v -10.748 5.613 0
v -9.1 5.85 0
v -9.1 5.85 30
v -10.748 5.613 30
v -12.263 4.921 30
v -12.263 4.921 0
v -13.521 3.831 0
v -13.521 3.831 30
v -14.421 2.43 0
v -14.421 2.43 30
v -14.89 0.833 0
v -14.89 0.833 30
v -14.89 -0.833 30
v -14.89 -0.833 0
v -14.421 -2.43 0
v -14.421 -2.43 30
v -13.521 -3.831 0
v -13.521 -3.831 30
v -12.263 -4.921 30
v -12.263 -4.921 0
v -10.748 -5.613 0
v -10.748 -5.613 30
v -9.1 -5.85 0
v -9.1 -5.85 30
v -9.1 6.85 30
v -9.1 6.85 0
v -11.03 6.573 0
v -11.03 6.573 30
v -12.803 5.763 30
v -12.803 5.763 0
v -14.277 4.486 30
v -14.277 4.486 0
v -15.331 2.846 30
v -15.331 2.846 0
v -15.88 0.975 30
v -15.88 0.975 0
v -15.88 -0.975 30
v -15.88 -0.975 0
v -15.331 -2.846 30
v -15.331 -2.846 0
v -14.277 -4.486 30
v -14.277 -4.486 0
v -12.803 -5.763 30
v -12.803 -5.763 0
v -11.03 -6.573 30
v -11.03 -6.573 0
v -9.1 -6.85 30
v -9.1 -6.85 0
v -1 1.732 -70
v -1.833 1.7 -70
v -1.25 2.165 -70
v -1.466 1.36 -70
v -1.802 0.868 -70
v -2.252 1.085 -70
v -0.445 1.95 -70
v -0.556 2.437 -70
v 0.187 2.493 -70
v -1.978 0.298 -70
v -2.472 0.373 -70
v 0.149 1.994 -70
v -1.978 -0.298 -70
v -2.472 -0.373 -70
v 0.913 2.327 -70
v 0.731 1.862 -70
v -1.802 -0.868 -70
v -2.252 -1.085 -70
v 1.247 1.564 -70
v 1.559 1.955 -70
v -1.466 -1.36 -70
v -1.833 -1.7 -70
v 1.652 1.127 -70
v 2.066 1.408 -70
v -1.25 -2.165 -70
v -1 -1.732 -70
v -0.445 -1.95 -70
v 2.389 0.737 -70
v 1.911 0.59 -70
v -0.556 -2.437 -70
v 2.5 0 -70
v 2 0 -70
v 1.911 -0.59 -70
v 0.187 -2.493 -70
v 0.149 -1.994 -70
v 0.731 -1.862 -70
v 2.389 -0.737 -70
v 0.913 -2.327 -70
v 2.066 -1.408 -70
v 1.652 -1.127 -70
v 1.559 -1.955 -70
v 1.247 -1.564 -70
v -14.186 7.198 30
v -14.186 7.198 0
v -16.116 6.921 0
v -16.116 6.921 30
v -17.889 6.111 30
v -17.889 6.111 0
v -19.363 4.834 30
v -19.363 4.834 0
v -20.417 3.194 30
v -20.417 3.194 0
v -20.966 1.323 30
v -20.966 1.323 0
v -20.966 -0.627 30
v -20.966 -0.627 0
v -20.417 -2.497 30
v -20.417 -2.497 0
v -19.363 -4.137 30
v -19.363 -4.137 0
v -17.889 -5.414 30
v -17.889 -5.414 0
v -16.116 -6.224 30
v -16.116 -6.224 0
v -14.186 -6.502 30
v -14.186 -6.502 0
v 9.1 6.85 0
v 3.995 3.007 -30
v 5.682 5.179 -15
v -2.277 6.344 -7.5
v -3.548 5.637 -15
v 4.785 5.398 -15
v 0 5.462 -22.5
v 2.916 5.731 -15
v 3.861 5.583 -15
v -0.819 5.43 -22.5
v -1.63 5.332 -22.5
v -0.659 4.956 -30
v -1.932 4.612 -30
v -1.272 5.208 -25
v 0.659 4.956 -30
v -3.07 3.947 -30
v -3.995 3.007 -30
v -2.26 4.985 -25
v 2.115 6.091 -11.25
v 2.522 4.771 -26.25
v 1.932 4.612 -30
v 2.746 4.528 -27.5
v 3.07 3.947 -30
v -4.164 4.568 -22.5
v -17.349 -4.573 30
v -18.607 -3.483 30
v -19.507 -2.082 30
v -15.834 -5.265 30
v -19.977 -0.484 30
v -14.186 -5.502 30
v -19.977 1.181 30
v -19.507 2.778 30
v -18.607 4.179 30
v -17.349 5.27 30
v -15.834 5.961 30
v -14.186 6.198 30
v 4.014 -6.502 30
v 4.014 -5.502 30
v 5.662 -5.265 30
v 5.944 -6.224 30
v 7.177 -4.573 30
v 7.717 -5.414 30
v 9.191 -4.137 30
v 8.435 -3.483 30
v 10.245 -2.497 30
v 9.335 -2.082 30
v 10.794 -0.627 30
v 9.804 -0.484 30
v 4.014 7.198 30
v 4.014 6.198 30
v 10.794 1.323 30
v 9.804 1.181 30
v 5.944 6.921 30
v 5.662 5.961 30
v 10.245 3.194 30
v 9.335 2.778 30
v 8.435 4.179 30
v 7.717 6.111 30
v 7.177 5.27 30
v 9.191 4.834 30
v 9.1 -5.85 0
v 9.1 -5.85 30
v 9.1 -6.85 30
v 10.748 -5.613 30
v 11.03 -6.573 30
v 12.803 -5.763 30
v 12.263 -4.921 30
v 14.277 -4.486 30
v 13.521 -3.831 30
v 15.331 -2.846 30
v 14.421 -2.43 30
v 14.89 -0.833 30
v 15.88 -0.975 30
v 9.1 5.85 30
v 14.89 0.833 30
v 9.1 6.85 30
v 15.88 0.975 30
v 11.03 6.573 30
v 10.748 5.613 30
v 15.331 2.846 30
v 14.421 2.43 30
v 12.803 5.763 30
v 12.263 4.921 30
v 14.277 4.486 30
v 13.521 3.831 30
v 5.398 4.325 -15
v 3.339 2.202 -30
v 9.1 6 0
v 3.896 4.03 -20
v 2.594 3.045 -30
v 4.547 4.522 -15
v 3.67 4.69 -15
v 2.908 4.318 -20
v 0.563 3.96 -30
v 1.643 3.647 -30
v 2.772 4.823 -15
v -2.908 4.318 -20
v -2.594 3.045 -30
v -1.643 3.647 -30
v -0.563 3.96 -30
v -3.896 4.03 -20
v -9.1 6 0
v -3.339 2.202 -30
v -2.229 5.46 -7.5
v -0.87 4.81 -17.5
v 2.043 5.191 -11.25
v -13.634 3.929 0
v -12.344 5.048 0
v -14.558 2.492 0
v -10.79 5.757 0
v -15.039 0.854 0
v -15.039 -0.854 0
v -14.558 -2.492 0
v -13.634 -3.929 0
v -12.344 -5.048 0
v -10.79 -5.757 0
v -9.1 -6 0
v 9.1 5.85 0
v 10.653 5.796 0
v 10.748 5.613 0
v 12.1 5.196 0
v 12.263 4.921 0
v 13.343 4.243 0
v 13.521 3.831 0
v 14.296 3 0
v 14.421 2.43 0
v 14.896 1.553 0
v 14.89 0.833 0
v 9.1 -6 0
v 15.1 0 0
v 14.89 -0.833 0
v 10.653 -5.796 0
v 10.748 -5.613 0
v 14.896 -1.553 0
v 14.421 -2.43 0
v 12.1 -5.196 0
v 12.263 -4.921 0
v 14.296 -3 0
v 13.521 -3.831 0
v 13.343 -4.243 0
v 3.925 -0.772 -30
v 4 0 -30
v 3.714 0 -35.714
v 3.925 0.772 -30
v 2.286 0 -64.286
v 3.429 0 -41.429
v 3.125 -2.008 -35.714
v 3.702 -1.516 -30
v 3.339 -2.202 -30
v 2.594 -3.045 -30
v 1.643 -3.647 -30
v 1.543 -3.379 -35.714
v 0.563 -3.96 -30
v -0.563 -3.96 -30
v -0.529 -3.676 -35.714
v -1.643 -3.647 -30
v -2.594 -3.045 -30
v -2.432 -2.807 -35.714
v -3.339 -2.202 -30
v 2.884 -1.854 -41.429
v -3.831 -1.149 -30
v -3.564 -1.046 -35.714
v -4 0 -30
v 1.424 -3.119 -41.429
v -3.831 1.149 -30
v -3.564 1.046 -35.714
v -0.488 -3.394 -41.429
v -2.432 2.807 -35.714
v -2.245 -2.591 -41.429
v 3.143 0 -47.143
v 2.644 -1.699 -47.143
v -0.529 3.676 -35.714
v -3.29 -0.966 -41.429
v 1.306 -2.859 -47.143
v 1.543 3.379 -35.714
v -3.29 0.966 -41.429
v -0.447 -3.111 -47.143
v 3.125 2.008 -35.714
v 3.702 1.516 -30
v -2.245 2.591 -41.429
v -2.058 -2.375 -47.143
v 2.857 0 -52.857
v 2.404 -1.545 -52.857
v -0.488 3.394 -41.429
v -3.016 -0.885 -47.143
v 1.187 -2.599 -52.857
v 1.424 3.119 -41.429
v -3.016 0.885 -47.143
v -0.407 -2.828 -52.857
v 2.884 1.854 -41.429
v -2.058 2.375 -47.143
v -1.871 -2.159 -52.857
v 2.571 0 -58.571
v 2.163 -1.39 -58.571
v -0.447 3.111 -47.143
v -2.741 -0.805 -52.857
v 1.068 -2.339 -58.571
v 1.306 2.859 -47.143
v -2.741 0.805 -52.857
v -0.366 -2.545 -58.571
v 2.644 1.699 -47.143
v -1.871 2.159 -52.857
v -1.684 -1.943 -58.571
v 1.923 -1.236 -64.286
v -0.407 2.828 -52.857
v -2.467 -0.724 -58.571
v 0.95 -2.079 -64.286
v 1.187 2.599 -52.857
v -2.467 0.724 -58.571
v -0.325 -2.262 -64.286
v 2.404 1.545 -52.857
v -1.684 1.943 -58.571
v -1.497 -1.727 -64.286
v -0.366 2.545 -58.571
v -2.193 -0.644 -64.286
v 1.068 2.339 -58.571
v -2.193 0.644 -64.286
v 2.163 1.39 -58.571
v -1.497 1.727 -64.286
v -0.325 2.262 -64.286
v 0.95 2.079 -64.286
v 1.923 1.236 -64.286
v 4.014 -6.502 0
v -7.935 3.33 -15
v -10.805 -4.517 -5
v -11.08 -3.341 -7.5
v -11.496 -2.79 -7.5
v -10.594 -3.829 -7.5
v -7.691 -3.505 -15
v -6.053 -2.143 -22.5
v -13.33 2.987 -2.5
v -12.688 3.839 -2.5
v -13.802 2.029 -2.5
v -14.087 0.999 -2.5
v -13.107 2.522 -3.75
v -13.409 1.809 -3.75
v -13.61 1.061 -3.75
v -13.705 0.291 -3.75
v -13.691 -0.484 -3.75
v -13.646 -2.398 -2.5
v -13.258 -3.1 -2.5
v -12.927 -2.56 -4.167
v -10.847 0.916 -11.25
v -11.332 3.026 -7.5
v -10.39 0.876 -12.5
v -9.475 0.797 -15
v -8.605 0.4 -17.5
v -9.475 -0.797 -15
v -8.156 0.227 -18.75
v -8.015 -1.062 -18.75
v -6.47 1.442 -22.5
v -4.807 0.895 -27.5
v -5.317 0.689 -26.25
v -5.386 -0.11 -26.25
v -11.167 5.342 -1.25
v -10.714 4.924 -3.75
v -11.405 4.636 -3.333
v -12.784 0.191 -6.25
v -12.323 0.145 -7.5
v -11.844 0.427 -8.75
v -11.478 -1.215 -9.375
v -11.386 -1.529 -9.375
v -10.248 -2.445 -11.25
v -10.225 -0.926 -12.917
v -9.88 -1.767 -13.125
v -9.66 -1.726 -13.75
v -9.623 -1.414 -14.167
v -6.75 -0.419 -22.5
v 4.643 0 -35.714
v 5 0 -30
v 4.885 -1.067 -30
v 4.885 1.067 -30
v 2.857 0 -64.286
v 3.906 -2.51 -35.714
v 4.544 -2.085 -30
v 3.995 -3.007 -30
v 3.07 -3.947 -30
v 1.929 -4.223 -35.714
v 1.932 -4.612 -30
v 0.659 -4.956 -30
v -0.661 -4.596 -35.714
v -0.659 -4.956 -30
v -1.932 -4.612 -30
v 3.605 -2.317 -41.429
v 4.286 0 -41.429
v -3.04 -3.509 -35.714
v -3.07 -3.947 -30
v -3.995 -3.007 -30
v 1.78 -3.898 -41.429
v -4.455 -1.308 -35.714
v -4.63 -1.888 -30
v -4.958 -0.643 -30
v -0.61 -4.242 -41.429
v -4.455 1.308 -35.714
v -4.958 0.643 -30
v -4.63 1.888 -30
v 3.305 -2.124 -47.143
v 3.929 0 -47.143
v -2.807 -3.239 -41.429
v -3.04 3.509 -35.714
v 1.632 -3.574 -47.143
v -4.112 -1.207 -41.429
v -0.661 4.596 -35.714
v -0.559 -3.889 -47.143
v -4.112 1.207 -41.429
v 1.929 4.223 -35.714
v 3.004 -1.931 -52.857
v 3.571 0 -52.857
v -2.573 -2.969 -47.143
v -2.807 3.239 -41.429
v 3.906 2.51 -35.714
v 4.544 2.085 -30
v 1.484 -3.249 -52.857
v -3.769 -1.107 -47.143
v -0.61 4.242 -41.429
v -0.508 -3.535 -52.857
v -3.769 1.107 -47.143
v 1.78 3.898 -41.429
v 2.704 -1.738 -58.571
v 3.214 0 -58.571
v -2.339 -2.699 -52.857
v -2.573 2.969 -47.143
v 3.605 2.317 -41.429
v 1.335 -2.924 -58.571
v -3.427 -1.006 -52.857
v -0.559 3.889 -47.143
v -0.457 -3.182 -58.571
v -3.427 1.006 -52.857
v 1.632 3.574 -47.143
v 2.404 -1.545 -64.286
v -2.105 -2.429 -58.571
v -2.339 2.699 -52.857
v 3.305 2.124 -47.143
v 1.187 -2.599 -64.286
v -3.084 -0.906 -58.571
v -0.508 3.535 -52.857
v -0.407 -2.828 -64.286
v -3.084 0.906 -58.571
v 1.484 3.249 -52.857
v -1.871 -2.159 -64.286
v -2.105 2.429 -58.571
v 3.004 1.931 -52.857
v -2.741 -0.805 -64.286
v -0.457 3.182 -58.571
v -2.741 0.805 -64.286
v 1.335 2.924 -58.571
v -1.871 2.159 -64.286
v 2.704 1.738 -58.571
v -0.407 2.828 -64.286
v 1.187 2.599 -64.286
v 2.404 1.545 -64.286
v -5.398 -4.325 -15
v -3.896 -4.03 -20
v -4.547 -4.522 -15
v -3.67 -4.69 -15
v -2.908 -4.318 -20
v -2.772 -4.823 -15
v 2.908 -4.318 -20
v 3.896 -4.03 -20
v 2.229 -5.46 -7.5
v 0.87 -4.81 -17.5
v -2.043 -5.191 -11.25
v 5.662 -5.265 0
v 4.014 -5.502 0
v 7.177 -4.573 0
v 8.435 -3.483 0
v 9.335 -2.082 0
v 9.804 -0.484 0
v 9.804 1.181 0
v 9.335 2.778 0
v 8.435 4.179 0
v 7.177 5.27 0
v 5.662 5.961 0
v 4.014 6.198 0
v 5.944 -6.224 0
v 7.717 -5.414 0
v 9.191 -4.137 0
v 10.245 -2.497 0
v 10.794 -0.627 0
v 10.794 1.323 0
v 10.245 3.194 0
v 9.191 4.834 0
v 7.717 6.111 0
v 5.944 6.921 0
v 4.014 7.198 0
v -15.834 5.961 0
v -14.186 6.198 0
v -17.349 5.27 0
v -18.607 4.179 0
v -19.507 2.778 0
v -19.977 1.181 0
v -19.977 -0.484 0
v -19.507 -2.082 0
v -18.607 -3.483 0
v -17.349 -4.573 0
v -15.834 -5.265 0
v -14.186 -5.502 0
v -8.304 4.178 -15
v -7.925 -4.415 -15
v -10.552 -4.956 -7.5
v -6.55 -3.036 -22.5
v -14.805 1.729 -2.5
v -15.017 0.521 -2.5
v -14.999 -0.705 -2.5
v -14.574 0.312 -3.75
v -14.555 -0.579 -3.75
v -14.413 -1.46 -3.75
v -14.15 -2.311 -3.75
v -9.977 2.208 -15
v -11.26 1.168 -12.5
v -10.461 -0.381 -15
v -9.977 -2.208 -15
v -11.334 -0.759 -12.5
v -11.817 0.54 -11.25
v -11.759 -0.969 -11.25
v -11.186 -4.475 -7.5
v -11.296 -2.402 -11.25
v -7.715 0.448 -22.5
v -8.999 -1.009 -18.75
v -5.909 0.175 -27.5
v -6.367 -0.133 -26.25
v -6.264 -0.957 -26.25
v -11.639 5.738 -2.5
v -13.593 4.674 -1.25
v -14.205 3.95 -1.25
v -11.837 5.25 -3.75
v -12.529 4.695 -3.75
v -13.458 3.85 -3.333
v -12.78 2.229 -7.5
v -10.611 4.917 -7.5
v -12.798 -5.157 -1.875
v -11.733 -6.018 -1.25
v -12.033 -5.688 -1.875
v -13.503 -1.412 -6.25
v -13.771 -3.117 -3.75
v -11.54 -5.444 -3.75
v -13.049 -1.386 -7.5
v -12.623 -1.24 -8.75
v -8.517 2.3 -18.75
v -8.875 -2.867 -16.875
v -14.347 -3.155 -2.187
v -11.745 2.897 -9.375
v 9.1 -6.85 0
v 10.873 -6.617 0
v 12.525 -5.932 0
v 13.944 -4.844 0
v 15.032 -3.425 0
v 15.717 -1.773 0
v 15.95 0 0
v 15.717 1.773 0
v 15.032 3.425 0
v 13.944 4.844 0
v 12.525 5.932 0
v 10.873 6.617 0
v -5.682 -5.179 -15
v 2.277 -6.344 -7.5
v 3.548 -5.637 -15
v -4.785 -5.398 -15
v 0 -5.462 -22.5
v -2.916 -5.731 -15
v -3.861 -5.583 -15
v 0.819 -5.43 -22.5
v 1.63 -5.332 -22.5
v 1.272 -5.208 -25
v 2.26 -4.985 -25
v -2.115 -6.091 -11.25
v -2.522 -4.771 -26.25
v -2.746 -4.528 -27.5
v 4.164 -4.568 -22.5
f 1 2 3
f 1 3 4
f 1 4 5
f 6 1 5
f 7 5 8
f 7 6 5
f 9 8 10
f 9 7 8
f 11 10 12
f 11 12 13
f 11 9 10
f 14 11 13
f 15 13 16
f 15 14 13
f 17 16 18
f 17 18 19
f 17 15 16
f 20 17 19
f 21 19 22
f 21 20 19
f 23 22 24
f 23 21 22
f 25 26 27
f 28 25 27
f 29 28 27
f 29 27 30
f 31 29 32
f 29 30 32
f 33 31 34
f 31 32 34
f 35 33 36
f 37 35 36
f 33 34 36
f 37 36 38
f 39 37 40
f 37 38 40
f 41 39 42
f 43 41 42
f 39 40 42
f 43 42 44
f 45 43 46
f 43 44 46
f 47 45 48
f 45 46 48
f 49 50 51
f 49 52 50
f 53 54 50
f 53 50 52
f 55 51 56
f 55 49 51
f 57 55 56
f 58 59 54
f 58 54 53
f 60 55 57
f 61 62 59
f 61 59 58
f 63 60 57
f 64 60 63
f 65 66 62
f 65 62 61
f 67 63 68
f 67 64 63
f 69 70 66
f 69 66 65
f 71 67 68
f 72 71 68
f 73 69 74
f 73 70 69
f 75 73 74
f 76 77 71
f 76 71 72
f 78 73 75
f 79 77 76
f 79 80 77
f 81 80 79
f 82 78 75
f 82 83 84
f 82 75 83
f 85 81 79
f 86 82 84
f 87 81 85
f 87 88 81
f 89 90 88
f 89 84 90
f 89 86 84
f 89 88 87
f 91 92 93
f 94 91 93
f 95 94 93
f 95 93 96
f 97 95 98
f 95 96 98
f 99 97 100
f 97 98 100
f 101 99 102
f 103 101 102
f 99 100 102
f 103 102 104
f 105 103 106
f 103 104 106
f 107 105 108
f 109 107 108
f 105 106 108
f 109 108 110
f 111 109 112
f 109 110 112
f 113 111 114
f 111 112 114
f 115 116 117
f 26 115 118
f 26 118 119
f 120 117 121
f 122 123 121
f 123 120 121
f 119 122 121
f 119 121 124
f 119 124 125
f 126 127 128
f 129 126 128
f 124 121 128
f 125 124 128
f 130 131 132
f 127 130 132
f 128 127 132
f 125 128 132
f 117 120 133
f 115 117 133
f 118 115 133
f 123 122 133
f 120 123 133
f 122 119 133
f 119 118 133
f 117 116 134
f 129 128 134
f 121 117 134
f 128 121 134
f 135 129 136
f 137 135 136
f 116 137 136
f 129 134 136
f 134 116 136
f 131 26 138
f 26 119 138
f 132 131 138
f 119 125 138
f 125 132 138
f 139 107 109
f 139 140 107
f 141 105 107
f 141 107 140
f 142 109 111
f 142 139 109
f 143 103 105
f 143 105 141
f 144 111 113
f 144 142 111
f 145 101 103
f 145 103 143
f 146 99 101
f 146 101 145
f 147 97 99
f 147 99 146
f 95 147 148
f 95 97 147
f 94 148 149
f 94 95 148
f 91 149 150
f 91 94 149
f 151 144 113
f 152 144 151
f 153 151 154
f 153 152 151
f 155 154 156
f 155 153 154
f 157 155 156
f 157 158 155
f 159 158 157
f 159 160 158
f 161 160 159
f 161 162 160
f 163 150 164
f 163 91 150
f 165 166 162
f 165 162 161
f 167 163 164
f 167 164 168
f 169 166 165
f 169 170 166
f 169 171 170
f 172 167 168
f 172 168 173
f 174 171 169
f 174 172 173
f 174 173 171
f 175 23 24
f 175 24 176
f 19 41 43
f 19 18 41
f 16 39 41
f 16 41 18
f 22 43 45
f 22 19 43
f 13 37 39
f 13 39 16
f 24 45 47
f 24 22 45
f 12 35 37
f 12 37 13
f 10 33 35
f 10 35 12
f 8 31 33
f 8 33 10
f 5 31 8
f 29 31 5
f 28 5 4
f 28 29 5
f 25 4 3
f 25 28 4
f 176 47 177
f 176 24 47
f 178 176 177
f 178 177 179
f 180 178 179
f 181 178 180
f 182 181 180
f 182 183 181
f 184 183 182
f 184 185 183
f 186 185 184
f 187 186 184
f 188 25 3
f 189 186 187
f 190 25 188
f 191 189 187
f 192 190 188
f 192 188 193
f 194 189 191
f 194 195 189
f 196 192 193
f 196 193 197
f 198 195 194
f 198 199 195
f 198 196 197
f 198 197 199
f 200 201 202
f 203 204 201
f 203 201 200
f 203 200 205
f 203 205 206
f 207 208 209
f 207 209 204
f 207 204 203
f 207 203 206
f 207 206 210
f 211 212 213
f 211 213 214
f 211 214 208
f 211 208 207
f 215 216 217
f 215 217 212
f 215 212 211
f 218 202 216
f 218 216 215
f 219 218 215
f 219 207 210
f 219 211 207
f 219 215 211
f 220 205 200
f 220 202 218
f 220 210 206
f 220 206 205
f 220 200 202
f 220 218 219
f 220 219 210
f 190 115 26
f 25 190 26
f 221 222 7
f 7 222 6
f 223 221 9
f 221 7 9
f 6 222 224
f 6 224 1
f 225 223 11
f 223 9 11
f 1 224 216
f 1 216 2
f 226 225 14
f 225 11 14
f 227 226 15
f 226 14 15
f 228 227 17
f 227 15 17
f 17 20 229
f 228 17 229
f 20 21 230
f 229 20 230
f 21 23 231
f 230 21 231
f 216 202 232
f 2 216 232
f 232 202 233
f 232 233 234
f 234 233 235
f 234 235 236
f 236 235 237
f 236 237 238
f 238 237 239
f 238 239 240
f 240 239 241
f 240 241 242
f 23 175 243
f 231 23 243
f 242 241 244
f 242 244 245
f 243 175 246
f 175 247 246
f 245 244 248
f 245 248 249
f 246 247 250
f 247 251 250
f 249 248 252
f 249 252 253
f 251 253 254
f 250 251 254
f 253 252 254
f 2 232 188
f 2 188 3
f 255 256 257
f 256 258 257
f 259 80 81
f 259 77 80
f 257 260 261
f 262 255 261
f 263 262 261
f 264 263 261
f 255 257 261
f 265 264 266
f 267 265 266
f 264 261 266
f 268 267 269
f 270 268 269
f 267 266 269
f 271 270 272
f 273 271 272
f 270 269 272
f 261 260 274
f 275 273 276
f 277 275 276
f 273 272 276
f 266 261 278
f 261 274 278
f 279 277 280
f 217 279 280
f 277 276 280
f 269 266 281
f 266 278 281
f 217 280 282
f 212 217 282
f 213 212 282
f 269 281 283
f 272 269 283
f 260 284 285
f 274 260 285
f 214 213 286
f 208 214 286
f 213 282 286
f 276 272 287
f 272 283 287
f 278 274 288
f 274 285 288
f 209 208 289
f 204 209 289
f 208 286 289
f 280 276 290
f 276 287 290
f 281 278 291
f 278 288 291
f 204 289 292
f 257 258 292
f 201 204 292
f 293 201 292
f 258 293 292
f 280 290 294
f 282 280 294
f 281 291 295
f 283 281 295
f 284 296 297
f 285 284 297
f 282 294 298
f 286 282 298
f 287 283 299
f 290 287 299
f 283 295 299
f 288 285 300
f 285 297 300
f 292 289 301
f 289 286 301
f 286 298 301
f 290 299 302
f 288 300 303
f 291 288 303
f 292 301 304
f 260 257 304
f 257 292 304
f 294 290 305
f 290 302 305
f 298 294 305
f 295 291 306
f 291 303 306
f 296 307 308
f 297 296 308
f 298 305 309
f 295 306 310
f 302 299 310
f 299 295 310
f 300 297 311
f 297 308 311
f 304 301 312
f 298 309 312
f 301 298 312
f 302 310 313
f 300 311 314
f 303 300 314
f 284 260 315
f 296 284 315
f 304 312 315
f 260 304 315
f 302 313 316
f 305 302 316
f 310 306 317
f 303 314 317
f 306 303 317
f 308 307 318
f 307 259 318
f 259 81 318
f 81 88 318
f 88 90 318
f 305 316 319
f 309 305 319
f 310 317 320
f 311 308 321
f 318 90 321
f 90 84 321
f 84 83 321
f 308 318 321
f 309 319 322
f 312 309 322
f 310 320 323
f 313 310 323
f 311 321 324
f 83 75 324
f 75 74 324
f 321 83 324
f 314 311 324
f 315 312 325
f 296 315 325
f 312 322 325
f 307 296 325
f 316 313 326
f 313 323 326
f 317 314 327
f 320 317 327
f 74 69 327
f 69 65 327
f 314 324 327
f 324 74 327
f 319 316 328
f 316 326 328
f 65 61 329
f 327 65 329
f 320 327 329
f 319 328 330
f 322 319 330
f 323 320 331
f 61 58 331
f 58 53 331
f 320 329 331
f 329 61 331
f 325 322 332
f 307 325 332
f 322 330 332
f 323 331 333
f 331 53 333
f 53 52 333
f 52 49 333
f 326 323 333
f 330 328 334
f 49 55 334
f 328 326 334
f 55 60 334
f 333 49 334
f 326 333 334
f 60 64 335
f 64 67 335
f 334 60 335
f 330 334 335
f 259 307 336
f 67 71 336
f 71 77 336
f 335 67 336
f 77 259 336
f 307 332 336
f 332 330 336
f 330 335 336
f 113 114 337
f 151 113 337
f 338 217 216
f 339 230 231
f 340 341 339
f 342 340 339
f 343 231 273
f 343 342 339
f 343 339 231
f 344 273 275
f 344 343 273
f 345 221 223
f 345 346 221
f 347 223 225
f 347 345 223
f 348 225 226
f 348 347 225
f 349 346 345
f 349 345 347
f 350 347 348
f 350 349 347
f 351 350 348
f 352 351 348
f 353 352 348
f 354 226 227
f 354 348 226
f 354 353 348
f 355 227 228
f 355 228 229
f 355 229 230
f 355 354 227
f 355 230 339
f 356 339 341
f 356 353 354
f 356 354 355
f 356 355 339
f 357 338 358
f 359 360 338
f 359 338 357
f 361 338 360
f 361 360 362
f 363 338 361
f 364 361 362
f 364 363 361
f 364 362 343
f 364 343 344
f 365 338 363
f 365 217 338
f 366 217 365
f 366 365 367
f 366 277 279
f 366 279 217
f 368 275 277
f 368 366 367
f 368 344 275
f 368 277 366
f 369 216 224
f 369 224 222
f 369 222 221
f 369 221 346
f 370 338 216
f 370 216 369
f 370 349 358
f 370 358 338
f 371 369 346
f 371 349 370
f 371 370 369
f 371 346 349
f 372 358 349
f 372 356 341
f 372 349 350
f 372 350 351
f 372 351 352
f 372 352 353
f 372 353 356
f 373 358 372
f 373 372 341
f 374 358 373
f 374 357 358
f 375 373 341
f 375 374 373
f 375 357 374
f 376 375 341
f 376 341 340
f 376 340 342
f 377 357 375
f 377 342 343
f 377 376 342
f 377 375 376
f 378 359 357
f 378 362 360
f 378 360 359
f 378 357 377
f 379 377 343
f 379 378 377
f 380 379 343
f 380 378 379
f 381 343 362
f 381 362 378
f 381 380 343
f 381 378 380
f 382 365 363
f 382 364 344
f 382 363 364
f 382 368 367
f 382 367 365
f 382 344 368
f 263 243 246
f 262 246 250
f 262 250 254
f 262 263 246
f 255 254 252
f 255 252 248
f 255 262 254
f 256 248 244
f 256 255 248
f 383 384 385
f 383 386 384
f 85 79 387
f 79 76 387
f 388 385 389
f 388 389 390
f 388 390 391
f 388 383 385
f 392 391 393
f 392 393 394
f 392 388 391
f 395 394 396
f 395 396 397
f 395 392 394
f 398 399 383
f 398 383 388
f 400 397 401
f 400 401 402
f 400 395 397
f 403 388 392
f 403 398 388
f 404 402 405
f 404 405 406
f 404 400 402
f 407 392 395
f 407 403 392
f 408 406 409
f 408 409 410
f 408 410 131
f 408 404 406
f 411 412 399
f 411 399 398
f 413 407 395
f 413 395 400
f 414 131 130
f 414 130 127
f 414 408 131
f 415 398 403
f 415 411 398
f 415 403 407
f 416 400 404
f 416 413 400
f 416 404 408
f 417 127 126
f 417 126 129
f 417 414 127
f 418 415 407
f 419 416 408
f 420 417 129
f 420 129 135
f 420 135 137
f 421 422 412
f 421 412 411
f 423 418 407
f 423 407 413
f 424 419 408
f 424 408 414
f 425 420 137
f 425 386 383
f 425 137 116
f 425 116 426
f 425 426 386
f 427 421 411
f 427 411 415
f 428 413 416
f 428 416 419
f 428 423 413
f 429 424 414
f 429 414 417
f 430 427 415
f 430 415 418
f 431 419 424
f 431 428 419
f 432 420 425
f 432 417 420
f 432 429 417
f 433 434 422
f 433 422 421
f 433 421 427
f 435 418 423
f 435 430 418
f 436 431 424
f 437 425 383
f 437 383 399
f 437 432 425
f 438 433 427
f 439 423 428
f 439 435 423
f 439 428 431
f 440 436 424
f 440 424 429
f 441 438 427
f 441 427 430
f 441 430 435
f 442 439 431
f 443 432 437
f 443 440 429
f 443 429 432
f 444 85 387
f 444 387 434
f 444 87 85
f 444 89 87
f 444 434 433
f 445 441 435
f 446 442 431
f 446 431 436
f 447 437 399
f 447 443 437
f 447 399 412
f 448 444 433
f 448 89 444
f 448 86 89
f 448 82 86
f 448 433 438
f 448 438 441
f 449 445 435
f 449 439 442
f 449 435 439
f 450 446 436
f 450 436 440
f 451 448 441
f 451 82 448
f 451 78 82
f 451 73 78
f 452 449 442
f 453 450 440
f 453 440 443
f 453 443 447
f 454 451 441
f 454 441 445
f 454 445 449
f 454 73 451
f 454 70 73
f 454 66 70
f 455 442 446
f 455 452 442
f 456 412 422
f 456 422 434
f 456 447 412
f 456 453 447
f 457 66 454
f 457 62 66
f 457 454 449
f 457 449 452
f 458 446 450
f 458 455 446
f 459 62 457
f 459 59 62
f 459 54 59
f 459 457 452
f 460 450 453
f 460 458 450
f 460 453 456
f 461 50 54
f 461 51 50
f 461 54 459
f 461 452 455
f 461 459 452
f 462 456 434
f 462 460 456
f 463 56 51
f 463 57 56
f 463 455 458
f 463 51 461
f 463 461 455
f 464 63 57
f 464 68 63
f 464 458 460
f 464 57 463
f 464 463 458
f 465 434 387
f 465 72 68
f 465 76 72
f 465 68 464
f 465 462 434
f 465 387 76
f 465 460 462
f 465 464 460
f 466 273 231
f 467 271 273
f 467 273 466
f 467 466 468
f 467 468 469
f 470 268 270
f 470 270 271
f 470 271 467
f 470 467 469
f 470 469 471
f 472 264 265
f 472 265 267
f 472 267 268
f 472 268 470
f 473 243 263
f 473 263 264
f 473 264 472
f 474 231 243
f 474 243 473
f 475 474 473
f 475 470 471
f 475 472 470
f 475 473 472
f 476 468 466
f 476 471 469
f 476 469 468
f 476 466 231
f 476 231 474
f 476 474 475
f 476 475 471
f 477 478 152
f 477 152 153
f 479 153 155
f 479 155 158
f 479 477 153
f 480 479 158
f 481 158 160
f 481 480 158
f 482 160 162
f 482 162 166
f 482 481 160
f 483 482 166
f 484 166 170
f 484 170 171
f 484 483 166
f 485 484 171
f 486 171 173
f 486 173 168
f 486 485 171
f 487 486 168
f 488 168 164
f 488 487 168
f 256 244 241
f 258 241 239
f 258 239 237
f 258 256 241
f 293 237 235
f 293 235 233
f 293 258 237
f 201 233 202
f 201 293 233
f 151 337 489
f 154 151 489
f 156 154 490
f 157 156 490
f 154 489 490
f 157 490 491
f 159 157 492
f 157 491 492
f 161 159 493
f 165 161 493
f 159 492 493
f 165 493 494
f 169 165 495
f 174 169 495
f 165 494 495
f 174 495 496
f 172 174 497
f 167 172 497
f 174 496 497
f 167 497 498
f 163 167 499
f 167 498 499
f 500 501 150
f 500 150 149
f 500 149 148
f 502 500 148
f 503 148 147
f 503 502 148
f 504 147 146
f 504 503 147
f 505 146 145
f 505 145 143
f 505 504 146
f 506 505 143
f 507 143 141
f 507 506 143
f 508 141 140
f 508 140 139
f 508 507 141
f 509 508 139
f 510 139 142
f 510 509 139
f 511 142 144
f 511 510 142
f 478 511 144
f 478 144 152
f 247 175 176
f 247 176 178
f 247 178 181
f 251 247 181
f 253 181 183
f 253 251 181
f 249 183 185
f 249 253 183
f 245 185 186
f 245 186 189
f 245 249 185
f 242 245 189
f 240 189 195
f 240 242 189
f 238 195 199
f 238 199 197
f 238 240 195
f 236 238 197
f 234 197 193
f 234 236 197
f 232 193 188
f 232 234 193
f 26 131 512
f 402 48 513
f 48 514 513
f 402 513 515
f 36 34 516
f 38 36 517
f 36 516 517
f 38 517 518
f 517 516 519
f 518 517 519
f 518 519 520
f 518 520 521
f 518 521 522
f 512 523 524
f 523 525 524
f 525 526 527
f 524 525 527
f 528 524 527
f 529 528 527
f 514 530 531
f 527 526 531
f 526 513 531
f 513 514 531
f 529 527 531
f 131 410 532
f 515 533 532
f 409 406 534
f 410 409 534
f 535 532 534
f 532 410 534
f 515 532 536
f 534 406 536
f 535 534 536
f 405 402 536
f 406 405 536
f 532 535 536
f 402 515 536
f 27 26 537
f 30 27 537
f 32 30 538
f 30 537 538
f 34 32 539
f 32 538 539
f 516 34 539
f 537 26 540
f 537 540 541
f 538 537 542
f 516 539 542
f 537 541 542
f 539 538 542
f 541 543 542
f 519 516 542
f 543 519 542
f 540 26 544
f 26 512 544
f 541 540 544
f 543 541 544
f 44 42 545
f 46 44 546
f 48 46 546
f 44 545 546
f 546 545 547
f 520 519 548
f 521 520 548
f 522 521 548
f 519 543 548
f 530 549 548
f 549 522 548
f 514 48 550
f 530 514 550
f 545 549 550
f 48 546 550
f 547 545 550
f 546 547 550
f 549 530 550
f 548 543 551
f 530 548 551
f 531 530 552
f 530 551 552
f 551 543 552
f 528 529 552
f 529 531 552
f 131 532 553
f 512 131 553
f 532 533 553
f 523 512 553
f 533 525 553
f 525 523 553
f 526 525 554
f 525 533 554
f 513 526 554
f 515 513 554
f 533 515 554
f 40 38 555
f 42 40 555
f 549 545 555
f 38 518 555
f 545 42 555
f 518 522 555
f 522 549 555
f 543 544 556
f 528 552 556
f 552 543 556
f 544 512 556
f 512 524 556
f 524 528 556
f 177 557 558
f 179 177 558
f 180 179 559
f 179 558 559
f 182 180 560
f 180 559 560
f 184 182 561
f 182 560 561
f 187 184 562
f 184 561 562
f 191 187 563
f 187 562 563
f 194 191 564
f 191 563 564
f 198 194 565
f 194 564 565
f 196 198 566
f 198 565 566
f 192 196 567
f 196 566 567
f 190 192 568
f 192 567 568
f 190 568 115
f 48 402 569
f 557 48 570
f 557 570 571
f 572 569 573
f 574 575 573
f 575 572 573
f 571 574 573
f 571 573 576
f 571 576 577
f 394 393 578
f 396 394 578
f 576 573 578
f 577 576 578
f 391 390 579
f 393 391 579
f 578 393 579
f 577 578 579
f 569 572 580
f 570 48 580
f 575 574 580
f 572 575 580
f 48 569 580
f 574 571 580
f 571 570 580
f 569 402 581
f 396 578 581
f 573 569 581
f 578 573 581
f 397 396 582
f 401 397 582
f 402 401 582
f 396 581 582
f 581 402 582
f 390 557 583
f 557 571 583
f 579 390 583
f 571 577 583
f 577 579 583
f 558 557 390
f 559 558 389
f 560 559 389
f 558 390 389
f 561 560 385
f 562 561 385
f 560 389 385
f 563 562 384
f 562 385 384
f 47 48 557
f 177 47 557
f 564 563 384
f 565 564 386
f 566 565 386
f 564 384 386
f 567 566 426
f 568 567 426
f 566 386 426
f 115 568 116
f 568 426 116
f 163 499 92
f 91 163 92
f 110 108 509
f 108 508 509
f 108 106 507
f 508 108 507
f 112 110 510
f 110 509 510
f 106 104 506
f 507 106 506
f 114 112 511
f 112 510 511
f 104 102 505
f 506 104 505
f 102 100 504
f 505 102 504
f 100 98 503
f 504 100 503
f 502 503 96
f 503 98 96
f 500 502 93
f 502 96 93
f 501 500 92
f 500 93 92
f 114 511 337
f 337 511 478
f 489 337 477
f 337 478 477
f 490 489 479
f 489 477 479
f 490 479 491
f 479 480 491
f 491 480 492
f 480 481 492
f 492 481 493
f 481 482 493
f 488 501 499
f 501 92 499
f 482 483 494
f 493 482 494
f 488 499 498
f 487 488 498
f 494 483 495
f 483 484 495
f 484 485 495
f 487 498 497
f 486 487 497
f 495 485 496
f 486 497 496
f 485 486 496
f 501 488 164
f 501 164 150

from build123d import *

# Parameters (mm, degrees)
PAD_DEPTH      = 30
THICKNESS_T    = -1
PAD001_DEPTH   = 30
THICKNESS001_T = -1
SKETCH006_R    = 5
SKETCH007_R    = 4
SKETCH010_R    = 5
SKETCH008_R    = 2.5
SKETCH011_R    = 4
SKETCH009_R    = 2


with BuildPart() as body:
    # Sketch001 → Pad (new body)
    with BuildSketch(Plane.XY):
        with BuildLine():
            Line((-14.186109, -6.501696), (4.013891, -6.501696))
            ThreePointArc((4.013891, -6.501696), (10.863891, 0.348304), (4.013891, 7.198304))
            Line((4.013891, 7.198304), (-14.186109, 7.198304))
            ThreePointArc((-14.186109, 7.198304), (-21.036109, 0.348304), (-14.186109, -6.501696))
        make_face()
    extrude(amount=PAD_DEPTH)

    # Thickness
    thickness_openings = [body.faces().sort_by_distance(p)[0] for p in [
        (-5.086109, 0.348304, 30),
        (-5.086109, 0.348304, 0),
    ]]
    offset(amount=THICKNESS_T, openings=thickness_openings)


with BuildPart() as body001:
    # Sketch → Pad001 (new body)
    with BuildSketch(Plane.XY):
        with BuildLine():
            Line((-9.1, -6.85), (9.1, -6.85))
            ThreePointArc((9.1, -6.85), (15.95, 0), (9.1, 6.85))
            Line((9.1, 6.85), (-9.1, 6.85))
            ThreePointArc((-9.1, 6.85), (-15.95, 0), (-9.1, -6.85))
        make_face()
    extrude(amount=PAD001_DEPTH)

    # Thickness001
    thickness001_openings = [body001.faces().sort_by_distance(p)[0] for p in [
        (0, 0, 30),
        (0, 0, 0),
    ]]
    offset(amount=THICKNESS001_T, openings=thickness001_openings)

    # Sketch004 → AdditiveLoft section 0
    with BuildSketch(Plane.XY):
        with BuildLine():
            Line((-9.1, -6.85), (9.1, -6.85))
            ThreePointArc((9.1, -6.85), (15.95, 0), (9.1, 6.85))
            Line((9.1, 6.85), (-9.1, 6.85))
            ThreePointArc((-9.1, 6.85), (-15.95, 0), (-9.1, -6.85))
        make_face()
    # Sketch006 (on DatumPlane) → AdditiveLoft section 1
    with BuildSketch(Plane(origin=(0, 0, -30), x_dir=(1, 0, 0), z_dir=(0, 0, -1))):
        Circle(SKETCH006_R)
    loft()

    # Sketch005 → SubtractiveLoft section 0
    with BuildSketch(Plane.XY):
        with BuildLine():
            Line((-9.1, -6), (9.1, -6))
            ThreePointArc((9.1, -6), (15.1, 0), (9.1, 6))
            Line((9.1, 6), (-9.1, 6))
            ThreePointArc((-9.1, 6), (-15.1, 0), (-9.1, -6))
        make_face()
    # Sketch007 (on DatumPlane) → SubtractiveLoft section 1
    with BuildSketch(Plane(origin=(0, 0, -30), x_dir=(1, 0, 0), z_dir=(0, 0, -1))):
        Circle(SKETCH007_R)
    loft(mode=Mode.SUBTRACT)

    # Sketch010 (on DatumPlane) → AdditiveLoft001 section 0
    with BuildSketch(Plane(origin=(0, 0, -30), x_dir=(1, 0, 0), z_dir=(0, 0, -1))):
        Circle(SKETCH010_R)
    # Sketch008 (on DatumPlane) → AdditiveLoft001 section 1
    with BuildSketch(Plane(origin=(0, 0, -70), x_dir=(1, 0, 0), z_dir=(0, 0, -1))):
        Circle(SKETCH008_R)
    loft()

    # Sketch011 (on DatumPlane) → SubtractiveLoft001 section 0
    with BuildSketch(Plane(origin=(0, 0, -30), x_dir=(1, 0, 0), z_dir=(0, 0, -1))):
        Circle(SKETCH011_R)
    # Sketch009 (on DatumPlane) → SubtractiveLoft001 section 1
    with BuildSketch(Plane(origin=(0, 0, -70), x_dir=(1, 0, 0), z_dir=(0, 0, -1))):
        Circle(SKETCH009_R)
    loft(mode=Mode.SUBTRACT)


solid = Compound([body.part, body001.part])
